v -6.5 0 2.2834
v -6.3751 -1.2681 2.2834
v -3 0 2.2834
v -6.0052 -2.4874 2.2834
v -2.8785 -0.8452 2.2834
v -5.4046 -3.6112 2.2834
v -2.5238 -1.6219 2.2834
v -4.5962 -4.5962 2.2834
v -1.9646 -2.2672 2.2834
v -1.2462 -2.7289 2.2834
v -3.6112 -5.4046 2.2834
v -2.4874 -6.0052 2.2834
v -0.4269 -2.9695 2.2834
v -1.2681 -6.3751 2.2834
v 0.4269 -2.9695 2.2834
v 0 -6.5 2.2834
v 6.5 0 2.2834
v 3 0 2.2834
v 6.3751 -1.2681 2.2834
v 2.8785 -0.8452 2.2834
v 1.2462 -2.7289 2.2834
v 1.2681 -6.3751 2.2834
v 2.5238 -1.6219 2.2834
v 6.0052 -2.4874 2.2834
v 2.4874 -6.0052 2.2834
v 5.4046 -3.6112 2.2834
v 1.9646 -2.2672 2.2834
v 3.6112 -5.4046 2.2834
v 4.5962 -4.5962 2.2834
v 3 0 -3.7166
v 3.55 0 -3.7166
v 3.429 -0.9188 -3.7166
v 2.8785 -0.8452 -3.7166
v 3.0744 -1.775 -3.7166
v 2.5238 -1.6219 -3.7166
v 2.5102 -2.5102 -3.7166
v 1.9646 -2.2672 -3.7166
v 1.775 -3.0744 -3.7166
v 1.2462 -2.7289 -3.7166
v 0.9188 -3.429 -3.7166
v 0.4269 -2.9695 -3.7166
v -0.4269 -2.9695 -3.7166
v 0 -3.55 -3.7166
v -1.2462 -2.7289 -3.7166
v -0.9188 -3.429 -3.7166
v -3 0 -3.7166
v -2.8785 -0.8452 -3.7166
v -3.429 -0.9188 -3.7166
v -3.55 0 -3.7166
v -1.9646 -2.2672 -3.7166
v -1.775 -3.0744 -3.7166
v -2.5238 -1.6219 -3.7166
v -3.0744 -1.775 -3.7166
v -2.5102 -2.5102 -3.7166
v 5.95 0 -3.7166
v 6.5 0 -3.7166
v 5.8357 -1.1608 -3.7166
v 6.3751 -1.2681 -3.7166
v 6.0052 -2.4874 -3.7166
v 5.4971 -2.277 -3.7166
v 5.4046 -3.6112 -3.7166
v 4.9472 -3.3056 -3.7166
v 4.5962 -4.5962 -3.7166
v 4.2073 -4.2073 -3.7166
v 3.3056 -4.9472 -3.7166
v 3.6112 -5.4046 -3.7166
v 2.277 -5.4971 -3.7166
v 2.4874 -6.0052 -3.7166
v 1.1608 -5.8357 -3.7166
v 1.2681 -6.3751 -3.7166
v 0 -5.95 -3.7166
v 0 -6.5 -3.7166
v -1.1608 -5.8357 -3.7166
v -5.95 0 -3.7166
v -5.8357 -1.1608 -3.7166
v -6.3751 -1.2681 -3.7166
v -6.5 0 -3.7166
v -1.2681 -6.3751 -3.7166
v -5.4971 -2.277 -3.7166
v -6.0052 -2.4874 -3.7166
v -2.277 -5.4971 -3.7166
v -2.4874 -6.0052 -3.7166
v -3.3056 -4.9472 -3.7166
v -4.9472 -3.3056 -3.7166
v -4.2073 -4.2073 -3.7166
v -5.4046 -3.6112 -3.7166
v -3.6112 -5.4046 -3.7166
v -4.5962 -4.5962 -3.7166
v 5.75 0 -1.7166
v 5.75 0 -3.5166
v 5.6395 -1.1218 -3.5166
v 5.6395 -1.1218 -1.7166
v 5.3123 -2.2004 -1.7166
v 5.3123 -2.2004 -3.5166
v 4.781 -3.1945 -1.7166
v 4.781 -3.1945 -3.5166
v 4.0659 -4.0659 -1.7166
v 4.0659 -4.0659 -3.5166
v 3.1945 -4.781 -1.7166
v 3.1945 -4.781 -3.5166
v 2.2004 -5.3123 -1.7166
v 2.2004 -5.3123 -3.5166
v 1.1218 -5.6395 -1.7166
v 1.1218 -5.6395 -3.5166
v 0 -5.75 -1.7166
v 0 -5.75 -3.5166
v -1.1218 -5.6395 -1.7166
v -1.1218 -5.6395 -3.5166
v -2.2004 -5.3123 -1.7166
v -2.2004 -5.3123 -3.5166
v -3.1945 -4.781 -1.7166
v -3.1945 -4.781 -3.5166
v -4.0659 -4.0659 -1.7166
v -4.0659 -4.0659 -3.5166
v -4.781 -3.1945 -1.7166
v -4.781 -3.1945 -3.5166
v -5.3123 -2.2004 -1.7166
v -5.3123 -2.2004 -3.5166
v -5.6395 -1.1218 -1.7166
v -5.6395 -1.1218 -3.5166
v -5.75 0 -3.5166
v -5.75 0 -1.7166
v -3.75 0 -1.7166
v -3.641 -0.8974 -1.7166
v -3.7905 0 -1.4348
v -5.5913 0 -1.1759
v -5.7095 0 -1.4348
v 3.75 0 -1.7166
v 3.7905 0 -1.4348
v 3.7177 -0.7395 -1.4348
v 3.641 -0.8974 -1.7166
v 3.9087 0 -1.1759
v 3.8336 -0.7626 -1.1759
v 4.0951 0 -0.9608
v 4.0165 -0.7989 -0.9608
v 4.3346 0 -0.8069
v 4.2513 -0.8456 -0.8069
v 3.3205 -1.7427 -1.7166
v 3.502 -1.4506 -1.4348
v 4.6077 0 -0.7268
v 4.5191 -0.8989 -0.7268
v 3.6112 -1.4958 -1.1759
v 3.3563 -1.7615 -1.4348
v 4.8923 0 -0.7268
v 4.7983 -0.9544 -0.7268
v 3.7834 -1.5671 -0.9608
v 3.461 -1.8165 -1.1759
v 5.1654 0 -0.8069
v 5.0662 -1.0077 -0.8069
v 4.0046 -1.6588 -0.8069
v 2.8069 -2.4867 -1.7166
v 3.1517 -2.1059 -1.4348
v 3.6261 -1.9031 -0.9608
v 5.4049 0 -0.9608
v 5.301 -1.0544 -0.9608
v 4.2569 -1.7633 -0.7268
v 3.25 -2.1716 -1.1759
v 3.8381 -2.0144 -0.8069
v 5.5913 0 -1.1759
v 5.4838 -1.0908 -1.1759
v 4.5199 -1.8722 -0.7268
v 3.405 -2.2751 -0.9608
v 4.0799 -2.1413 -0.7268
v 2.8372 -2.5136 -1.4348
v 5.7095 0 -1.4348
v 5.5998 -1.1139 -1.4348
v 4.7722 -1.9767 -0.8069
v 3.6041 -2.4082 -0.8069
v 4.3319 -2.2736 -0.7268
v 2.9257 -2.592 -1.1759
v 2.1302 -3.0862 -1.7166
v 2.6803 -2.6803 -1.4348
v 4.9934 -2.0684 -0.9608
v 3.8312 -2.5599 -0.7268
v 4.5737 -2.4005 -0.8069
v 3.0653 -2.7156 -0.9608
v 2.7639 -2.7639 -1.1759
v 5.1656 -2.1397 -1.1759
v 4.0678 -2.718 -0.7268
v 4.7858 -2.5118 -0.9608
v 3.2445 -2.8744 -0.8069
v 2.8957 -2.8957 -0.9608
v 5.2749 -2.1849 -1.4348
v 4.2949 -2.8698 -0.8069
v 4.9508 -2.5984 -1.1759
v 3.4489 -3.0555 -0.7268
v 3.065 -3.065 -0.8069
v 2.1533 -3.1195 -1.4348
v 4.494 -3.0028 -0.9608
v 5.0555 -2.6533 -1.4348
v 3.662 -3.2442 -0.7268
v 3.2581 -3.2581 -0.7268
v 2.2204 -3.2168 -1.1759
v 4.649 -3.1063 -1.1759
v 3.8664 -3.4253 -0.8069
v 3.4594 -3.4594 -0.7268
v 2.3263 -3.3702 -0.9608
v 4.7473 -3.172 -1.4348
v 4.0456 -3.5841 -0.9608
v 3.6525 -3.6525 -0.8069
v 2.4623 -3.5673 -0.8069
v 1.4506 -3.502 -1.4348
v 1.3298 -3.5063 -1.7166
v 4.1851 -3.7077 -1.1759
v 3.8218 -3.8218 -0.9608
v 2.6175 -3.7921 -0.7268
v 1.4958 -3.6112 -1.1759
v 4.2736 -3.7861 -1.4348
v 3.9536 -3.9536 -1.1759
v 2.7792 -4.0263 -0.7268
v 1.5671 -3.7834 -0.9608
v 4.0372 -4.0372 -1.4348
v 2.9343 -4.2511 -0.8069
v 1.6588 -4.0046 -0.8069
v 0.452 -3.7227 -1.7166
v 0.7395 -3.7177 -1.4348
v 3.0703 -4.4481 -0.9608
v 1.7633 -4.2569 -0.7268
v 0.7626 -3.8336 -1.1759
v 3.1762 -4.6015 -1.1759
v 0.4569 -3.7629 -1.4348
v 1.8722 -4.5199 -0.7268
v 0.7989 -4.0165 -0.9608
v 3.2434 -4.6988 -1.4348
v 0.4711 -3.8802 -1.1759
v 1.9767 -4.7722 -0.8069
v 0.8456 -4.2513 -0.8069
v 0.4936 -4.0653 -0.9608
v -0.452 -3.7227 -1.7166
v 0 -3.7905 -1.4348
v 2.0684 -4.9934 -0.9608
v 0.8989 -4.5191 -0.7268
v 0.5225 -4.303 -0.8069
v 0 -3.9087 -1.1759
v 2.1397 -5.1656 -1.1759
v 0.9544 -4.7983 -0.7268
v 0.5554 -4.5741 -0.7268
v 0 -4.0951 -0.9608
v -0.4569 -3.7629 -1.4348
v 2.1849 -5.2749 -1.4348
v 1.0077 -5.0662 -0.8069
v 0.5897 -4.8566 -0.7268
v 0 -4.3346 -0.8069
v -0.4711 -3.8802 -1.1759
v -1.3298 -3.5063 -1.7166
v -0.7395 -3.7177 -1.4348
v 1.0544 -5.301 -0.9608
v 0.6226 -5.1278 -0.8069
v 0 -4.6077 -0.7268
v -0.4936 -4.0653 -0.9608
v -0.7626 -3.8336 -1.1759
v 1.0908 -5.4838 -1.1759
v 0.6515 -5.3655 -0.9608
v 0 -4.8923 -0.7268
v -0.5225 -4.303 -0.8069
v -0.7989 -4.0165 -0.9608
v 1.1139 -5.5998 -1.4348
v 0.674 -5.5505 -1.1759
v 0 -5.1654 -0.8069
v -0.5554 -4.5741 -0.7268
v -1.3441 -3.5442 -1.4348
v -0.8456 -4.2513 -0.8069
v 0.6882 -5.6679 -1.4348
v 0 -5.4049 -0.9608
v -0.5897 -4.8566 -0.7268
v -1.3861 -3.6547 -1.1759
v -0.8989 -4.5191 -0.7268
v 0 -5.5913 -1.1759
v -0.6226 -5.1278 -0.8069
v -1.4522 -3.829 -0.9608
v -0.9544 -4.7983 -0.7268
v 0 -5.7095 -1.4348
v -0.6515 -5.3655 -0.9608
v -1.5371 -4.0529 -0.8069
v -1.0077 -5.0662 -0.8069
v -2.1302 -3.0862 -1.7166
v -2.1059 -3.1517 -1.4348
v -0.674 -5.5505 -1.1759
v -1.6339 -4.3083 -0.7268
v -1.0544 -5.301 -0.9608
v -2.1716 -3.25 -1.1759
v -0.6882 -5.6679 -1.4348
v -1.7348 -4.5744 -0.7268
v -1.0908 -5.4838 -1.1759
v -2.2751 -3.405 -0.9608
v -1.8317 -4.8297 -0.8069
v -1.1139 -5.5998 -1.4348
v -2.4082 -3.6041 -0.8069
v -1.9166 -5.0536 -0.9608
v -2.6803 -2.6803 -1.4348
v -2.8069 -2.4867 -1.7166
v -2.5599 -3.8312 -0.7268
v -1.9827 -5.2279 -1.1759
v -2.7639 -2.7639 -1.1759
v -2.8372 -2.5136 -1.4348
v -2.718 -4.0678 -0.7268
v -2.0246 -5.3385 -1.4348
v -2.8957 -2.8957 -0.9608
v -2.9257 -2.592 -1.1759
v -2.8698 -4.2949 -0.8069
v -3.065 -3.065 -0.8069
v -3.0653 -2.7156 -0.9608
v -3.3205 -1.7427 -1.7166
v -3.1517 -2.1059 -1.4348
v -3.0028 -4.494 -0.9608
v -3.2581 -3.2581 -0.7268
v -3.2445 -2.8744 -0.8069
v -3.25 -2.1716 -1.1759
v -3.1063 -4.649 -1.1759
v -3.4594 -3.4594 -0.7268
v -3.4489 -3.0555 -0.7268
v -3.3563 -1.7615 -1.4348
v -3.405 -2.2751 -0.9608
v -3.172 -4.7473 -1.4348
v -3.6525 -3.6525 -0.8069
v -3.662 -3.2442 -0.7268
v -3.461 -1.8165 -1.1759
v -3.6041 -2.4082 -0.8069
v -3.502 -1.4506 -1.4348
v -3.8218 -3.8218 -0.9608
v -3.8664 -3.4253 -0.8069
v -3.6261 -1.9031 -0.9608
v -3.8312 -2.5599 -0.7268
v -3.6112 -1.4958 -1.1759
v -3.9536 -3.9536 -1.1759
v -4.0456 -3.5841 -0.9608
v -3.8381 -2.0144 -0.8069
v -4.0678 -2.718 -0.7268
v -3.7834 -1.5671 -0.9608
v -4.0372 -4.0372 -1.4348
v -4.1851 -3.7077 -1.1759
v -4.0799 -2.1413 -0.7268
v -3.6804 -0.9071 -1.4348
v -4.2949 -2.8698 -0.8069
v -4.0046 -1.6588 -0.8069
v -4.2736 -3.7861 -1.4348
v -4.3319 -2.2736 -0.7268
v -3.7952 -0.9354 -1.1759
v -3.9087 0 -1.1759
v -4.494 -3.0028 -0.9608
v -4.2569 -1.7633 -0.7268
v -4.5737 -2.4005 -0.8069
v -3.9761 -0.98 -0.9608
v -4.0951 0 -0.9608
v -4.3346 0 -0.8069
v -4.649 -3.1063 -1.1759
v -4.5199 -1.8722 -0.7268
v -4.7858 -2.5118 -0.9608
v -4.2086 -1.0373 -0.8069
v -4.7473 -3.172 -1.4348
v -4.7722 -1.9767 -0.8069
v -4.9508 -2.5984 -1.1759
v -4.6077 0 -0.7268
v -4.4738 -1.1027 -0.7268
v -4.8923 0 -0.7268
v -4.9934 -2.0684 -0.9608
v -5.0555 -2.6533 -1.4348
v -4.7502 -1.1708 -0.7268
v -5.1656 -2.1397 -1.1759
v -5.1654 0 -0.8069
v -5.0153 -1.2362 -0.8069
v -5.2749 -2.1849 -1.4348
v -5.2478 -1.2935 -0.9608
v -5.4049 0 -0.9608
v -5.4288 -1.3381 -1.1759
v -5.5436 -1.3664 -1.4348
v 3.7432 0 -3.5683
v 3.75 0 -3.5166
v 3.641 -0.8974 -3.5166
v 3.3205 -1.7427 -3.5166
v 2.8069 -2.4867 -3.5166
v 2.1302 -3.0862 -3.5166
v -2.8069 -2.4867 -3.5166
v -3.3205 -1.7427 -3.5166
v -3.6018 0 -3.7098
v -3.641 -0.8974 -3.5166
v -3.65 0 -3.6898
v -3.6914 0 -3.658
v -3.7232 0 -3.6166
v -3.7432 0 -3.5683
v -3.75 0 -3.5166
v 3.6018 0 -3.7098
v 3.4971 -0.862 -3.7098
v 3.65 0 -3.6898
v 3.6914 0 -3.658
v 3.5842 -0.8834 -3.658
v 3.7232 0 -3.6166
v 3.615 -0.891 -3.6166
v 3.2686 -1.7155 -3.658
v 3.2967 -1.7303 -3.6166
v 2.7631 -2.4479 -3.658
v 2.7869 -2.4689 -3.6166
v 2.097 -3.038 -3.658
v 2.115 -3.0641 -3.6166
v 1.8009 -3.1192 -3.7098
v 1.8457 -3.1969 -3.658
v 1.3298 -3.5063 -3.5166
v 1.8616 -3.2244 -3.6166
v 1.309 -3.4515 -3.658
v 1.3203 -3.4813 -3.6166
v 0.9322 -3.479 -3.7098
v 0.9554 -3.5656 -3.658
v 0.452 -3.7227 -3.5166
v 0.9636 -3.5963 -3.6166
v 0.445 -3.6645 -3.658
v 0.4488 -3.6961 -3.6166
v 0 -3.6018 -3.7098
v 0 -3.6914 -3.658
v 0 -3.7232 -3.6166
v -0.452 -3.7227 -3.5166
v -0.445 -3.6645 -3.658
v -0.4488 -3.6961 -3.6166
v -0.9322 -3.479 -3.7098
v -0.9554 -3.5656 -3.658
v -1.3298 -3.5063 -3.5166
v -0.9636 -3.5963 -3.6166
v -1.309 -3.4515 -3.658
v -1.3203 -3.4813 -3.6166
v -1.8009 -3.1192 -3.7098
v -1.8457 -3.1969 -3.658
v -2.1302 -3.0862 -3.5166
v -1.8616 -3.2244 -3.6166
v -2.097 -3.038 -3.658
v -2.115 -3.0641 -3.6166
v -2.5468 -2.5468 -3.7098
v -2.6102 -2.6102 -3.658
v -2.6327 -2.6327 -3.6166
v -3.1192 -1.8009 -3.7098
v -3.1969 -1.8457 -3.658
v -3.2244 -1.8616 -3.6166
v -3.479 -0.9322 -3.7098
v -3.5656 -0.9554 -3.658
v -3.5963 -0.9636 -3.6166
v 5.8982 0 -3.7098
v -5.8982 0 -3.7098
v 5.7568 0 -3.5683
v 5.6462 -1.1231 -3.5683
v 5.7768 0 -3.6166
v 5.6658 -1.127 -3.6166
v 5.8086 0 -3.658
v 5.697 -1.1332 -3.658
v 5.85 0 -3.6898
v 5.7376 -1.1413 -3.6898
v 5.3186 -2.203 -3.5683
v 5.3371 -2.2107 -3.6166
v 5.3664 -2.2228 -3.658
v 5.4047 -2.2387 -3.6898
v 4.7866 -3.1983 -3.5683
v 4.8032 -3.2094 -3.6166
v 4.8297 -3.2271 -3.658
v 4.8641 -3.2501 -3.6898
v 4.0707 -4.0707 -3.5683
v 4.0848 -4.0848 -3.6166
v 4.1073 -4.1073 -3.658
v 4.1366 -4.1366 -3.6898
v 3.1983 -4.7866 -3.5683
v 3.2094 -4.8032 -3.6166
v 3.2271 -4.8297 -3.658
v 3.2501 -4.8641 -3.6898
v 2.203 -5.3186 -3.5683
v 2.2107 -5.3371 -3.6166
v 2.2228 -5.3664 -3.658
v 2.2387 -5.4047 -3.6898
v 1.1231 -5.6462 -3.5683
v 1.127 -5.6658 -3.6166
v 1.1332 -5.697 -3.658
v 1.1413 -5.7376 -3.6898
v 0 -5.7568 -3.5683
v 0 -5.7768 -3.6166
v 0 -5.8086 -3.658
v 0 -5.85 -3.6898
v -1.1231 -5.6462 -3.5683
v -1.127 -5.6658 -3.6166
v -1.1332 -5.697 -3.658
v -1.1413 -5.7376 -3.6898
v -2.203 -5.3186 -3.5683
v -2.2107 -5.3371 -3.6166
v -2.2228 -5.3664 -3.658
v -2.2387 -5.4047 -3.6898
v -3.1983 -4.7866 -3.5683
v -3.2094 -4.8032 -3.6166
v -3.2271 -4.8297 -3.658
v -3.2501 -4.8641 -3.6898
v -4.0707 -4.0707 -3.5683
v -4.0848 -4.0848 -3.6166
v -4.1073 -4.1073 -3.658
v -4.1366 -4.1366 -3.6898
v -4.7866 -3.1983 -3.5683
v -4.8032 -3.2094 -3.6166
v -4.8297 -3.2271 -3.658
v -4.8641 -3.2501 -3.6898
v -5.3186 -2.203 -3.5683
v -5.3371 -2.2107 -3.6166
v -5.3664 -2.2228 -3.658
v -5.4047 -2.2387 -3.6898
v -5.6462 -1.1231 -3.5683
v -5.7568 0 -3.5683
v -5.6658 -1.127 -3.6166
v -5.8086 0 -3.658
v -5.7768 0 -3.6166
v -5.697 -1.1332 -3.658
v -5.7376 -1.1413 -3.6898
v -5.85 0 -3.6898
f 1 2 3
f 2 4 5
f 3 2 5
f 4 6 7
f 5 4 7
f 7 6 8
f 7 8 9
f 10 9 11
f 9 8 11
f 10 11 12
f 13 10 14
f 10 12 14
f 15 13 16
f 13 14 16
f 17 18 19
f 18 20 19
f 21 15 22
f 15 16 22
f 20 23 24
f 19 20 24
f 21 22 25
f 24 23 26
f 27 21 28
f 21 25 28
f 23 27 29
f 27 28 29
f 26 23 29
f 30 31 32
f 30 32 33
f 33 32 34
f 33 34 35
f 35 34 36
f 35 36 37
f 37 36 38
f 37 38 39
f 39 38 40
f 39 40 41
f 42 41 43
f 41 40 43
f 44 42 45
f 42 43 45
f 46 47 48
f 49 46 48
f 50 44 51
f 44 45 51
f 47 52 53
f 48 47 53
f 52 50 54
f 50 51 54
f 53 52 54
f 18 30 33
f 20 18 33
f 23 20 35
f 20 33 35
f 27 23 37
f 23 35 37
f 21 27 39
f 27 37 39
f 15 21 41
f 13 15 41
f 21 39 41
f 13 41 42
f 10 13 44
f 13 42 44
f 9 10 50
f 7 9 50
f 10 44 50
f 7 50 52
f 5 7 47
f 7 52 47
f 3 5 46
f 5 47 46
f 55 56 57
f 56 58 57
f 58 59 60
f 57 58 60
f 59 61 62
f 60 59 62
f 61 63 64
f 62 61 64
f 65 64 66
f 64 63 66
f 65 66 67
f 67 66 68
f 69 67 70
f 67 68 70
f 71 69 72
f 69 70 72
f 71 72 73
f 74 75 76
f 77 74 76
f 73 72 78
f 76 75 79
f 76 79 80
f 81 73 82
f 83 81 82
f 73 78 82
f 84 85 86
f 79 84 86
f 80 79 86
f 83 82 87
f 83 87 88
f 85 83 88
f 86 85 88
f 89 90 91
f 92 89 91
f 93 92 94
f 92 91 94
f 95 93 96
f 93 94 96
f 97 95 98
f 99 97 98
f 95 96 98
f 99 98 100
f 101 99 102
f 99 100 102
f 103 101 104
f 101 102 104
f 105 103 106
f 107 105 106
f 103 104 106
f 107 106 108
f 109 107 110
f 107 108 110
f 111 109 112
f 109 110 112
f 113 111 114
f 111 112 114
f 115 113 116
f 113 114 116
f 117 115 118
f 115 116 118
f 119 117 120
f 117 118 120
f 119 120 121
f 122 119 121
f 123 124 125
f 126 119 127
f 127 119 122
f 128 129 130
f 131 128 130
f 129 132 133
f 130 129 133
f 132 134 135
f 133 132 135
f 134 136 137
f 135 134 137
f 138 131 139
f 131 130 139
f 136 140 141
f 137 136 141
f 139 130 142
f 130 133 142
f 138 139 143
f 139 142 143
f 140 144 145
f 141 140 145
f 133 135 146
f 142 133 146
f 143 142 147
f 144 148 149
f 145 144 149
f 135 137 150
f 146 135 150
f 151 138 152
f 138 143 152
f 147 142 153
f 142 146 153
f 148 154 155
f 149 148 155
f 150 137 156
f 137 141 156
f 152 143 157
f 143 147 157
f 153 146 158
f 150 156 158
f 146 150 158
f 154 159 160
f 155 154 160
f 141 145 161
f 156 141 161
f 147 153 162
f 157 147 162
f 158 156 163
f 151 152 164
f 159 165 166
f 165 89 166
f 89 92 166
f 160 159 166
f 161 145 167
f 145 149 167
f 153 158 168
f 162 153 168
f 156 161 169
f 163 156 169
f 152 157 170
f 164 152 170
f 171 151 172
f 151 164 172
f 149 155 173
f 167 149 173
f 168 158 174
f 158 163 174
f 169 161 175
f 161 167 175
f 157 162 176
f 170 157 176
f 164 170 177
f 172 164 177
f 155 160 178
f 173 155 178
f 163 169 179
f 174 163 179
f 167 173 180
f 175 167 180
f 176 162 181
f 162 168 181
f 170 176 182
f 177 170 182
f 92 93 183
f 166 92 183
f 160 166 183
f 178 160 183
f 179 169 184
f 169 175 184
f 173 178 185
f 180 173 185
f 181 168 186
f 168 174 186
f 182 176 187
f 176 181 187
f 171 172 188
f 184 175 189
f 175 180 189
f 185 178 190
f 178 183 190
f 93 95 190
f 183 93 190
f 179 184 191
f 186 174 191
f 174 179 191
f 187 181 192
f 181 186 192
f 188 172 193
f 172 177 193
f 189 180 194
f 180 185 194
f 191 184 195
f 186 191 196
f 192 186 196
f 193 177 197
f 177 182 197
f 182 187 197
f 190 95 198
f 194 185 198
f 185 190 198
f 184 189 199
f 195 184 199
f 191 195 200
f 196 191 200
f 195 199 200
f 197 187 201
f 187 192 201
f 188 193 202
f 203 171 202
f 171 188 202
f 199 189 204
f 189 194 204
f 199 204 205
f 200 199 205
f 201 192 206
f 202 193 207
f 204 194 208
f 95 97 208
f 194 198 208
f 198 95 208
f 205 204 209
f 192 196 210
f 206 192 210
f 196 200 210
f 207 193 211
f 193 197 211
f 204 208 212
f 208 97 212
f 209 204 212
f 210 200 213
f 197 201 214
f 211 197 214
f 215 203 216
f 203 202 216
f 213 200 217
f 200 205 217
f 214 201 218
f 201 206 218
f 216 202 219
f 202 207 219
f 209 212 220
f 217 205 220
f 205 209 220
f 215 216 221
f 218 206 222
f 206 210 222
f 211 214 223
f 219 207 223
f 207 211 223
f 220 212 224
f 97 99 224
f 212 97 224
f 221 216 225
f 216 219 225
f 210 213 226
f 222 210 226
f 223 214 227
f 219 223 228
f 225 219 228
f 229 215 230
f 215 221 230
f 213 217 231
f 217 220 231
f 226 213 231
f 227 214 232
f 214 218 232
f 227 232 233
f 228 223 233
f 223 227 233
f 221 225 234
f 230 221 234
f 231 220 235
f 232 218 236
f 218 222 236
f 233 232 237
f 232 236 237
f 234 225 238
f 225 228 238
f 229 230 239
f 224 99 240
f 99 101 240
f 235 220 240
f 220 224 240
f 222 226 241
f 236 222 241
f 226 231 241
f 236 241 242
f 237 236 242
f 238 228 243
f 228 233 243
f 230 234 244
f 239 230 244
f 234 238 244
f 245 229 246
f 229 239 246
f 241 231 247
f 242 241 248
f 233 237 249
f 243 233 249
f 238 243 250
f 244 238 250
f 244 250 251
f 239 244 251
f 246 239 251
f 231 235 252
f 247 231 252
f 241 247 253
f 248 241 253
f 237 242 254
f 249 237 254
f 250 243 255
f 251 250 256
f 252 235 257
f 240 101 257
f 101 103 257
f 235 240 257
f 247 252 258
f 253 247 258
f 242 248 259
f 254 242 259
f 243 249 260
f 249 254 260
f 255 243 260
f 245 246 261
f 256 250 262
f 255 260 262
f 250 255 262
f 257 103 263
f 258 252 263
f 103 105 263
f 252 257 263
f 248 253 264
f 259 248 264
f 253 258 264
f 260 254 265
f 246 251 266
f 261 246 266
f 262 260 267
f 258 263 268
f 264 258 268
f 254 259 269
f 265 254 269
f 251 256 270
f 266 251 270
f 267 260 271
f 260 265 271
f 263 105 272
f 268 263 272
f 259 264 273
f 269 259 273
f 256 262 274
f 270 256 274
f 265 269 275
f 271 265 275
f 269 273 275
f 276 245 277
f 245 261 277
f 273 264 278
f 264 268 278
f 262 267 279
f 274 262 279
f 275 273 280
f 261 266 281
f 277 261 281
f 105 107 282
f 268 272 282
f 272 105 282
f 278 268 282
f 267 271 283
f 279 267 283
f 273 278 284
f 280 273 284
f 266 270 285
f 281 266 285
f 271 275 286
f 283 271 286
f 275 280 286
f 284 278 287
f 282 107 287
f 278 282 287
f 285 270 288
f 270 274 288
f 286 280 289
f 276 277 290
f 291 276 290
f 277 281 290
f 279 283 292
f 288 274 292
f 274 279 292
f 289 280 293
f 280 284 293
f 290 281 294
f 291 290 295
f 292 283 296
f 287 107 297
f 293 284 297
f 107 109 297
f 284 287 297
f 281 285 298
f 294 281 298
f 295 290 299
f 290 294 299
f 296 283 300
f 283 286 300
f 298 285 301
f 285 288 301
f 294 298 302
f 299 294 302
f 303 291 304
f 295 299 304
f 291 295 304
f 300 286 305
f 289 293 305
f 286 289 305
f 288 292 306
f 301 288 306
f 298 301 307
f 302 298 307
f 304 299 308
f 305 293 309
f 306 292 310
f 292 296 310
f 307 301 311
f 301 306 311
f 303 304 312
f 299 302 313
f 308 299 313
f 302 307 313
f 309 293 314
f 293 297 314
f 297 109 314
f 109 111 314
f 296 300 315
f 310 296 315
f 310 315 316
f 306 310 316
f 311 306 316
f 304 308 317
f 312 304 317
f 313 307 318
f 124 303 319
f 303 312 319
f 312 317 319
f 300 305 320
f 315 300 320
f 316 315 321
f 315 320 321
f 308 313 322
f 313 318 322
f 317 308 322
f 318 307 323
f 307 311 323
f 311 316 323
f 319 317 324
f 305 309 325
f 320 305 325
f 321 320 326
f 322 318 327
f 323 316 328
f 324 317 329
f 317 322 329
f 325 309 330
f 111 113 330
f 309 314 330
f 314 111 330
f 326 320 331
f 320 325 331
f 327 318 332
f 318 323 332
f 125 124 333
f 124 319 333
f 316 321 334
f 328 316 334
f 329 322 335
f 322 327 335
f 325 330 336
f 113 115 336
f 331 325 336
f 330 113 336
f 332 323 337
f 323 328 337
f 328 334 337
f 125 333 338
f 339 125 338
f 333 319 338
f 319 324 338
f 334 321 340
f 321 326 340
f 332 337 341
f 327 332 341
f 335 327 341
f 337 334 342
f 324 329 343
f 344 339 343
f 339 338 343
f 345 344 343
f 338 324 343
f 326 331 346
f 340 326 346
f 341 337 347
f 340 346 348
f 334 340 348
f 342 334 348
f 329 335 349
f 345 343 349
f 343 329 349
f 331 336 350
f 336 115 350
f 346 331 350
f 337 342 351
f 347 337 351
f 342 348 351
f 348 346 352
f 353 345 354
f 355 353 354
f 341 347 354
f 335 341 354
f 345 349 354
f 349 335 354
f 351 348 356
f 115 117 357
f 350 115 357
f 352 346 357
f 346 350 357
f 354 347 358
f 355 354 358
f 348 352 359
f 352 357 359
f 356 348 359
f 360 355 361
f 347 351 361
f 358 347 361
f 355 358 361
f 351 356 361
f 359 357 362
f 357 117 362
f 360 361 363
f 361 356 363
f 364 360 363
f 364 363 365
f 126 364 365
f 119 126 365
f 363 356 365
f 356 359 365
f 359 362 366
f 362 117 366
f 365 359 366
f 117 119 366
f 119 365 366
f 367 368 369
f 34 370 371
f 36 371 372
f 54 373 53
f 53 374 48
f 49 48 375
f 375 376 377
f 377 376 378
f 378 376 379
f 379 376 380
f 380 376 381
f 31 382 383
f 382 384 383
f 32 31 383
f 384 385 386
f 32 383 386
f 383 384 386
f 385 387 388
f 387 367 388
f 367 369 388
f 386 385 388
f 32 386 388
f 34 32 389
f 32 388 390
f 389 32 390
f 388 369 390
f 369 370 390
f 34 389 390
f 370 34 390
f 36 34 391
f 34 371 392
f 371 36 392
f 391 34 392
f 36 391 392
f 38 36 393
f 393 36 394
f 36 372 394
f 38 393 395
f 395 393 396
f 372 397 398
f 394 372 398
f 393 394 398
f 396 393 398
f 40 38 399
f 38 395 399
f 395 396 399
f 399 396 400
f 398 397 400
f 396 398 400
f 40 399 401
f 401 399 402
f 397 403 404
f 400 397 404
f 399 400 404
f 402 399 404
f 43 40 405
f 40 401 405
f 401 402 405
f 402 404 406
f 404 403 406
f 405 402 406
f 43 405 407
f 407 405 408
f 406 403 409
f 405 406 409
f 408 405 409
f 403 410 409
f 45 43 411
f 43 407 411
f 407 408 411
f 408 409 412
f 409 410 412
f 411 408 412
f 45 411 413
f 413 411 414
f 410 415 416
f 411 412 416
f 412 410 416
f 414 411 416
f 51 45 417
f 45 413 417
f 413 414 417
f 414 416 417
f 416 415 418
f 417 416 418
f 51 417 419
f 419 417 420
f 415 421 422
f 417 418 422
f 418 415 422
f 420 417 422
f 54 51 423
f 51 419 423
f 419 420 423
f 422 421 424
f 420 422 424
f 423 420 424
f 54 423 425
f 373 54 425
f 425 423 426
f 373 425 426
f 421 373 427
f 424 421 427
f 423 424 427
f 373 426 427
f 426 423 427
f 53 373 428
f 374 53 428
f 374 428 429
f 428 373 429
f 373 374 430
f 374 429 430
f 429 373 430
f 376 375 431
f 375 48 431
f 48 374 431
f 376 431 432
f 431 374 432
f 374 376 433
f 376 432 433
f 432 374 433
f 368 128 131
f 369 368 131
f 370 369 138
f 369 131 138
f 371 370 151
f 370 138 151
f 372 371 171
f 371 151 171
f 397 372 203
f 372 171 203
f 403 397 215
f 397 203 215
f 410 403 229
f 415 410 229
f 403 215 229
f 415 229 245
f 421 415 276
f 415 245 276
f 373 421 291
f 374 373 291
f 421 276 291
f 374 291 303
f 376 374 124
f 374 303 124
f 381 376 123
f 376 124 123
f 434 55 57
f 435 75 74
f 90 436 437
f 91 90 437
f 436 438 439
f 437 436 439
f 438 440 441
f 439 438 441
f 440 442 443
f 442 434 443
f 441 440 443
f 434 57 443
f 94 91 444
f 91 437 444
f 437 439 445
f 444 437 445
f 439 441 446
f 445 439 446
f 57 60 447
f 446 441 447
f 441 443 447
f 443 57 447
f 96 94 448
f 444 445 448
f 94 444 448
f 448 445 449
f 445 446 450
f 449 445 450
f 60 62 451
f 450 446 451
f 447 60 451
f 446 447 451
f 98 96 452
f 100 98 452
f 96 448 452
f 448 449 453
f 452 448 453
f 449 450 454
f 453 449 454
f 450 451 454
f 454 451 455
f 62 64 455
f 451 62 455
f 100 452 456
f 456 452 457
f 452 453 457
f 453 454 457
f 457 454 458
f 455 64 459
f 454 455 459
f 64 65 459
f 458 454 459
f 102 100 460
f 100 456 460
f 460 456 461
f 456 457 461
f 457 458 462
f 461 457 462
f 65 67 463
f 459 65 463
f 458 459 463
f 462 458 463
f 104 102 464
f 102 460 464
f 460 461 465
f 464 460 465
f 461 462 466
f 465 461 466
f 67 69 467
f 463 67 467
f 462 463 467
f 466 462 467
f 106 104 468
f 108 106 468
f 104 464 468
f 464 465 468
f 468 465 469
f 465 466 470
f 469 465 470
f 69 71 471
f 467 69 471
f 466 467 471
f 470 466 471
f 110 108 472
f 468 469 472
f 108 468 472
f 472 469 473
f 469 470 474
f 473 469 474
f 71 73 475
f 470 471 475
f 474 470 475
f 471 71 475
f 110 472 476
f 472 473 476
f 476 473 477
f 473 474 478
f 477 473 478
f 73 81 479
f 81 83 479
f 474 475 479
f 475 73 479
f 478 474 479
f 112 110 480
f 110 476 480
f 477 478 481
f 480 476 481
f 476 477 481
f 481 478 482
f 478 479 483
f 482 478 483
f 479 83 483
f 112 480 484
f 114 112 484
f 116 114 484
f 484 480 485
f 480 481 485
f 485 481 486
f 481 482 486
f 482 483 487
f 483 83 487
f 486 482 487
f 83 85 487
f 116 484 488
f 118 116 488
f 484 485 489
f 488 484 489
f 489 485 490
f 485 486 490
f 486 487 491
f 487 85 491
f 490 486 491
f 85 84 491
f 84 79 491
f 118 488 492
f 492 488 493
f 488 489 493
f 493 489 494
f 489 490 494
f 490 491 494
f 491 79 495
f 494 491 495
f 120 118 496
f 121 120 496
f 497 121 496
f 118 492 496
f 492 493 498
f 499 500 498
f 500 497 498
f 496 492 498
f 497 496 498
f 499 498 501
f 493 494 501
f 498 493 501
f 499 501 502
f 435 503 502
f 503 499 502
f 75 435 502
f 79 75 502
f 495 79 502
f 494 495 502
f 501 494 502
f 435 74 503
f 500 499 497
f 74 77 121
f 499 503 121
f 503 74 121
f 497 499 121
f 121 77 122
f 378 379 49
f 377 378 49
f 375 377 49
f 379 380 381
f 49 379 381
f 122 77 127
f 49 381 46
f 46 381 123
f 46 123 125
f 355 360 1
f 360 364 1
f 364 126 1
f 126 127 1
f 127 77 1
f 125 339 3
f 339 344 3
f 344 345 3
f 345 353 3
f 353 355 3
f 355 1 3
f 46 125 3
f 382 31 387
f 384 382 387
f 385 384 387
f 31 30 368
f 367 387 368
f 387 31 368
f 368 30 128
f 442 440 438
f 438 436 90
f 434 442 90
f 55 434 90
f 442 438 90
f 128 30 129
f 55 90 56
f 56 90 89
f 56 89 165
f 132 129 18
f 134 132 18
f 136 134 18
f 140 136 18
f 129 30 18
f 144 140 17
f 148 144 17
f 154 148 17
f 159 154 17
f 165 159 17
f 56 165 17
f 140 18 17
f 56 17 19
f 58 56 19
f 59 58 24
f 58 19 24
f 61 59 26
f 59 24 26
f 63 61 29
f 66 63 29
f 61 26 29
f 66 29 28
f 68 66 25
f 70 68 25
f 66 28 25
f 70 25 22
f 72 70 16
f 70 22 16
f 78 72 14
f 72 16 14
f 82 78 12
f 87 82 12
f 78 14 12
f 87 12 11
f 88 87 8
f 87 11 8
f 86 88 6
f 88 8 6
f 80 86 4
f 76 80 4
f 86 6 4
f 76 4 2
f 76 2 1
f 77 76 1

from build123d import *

# Parameters (mm, degrees)
F2_R     = 0.2
F3_W     = 35.523725
F3_H     = 30.81022
F4_DEPTH = 25


with BuildPart() as f1:
    # F0 (on Front) → F1 (revolve)
    with BuildSketch(Plane.XZ):
        with BuildLine():
            Line((6.5, 2.283427), (3, 2.283427))
            Line((3, 2.283427), (3, -3.716573))
            Line((3, -3.716573), (3.75, -3.716573))
            Line((3.75, -3.716573), (3.75, -1.716573))
            ThreePointArc((3.75, -1.716573), (4.75, -0.716573), (5.75, -1.716573))
            Line((5.75, -1.716573), (5.75, -3.716573))
            Line((5.75, -3.716573), (6.5, -3.716573))
            Line((6.5, -3.716573), (6.5, 2.283427))
        make_face()
    revolve(axis=Axis((0, 0, -0.059434), (0, 0, -1)))

    # F2
    f2_edges = [f1.edges().sort_by_distance(p)[0] for p in [
        (-5.75, 0, -3.716573),
        (-3.75, 0, -3.716573),
    ]]
    fillet(f2_edges, radius=F2_R)

    # F3 (on Front) → F4 (cut)
    with BuildSketch(Plane.XZ):
        with Locations((2.952699, 0.107419)):
            Rectangle(F3_W, F3_H)
    extrude(amount=-F4_DEPTH, mode=Mode.SUBTRACT)


solid = f1.part
